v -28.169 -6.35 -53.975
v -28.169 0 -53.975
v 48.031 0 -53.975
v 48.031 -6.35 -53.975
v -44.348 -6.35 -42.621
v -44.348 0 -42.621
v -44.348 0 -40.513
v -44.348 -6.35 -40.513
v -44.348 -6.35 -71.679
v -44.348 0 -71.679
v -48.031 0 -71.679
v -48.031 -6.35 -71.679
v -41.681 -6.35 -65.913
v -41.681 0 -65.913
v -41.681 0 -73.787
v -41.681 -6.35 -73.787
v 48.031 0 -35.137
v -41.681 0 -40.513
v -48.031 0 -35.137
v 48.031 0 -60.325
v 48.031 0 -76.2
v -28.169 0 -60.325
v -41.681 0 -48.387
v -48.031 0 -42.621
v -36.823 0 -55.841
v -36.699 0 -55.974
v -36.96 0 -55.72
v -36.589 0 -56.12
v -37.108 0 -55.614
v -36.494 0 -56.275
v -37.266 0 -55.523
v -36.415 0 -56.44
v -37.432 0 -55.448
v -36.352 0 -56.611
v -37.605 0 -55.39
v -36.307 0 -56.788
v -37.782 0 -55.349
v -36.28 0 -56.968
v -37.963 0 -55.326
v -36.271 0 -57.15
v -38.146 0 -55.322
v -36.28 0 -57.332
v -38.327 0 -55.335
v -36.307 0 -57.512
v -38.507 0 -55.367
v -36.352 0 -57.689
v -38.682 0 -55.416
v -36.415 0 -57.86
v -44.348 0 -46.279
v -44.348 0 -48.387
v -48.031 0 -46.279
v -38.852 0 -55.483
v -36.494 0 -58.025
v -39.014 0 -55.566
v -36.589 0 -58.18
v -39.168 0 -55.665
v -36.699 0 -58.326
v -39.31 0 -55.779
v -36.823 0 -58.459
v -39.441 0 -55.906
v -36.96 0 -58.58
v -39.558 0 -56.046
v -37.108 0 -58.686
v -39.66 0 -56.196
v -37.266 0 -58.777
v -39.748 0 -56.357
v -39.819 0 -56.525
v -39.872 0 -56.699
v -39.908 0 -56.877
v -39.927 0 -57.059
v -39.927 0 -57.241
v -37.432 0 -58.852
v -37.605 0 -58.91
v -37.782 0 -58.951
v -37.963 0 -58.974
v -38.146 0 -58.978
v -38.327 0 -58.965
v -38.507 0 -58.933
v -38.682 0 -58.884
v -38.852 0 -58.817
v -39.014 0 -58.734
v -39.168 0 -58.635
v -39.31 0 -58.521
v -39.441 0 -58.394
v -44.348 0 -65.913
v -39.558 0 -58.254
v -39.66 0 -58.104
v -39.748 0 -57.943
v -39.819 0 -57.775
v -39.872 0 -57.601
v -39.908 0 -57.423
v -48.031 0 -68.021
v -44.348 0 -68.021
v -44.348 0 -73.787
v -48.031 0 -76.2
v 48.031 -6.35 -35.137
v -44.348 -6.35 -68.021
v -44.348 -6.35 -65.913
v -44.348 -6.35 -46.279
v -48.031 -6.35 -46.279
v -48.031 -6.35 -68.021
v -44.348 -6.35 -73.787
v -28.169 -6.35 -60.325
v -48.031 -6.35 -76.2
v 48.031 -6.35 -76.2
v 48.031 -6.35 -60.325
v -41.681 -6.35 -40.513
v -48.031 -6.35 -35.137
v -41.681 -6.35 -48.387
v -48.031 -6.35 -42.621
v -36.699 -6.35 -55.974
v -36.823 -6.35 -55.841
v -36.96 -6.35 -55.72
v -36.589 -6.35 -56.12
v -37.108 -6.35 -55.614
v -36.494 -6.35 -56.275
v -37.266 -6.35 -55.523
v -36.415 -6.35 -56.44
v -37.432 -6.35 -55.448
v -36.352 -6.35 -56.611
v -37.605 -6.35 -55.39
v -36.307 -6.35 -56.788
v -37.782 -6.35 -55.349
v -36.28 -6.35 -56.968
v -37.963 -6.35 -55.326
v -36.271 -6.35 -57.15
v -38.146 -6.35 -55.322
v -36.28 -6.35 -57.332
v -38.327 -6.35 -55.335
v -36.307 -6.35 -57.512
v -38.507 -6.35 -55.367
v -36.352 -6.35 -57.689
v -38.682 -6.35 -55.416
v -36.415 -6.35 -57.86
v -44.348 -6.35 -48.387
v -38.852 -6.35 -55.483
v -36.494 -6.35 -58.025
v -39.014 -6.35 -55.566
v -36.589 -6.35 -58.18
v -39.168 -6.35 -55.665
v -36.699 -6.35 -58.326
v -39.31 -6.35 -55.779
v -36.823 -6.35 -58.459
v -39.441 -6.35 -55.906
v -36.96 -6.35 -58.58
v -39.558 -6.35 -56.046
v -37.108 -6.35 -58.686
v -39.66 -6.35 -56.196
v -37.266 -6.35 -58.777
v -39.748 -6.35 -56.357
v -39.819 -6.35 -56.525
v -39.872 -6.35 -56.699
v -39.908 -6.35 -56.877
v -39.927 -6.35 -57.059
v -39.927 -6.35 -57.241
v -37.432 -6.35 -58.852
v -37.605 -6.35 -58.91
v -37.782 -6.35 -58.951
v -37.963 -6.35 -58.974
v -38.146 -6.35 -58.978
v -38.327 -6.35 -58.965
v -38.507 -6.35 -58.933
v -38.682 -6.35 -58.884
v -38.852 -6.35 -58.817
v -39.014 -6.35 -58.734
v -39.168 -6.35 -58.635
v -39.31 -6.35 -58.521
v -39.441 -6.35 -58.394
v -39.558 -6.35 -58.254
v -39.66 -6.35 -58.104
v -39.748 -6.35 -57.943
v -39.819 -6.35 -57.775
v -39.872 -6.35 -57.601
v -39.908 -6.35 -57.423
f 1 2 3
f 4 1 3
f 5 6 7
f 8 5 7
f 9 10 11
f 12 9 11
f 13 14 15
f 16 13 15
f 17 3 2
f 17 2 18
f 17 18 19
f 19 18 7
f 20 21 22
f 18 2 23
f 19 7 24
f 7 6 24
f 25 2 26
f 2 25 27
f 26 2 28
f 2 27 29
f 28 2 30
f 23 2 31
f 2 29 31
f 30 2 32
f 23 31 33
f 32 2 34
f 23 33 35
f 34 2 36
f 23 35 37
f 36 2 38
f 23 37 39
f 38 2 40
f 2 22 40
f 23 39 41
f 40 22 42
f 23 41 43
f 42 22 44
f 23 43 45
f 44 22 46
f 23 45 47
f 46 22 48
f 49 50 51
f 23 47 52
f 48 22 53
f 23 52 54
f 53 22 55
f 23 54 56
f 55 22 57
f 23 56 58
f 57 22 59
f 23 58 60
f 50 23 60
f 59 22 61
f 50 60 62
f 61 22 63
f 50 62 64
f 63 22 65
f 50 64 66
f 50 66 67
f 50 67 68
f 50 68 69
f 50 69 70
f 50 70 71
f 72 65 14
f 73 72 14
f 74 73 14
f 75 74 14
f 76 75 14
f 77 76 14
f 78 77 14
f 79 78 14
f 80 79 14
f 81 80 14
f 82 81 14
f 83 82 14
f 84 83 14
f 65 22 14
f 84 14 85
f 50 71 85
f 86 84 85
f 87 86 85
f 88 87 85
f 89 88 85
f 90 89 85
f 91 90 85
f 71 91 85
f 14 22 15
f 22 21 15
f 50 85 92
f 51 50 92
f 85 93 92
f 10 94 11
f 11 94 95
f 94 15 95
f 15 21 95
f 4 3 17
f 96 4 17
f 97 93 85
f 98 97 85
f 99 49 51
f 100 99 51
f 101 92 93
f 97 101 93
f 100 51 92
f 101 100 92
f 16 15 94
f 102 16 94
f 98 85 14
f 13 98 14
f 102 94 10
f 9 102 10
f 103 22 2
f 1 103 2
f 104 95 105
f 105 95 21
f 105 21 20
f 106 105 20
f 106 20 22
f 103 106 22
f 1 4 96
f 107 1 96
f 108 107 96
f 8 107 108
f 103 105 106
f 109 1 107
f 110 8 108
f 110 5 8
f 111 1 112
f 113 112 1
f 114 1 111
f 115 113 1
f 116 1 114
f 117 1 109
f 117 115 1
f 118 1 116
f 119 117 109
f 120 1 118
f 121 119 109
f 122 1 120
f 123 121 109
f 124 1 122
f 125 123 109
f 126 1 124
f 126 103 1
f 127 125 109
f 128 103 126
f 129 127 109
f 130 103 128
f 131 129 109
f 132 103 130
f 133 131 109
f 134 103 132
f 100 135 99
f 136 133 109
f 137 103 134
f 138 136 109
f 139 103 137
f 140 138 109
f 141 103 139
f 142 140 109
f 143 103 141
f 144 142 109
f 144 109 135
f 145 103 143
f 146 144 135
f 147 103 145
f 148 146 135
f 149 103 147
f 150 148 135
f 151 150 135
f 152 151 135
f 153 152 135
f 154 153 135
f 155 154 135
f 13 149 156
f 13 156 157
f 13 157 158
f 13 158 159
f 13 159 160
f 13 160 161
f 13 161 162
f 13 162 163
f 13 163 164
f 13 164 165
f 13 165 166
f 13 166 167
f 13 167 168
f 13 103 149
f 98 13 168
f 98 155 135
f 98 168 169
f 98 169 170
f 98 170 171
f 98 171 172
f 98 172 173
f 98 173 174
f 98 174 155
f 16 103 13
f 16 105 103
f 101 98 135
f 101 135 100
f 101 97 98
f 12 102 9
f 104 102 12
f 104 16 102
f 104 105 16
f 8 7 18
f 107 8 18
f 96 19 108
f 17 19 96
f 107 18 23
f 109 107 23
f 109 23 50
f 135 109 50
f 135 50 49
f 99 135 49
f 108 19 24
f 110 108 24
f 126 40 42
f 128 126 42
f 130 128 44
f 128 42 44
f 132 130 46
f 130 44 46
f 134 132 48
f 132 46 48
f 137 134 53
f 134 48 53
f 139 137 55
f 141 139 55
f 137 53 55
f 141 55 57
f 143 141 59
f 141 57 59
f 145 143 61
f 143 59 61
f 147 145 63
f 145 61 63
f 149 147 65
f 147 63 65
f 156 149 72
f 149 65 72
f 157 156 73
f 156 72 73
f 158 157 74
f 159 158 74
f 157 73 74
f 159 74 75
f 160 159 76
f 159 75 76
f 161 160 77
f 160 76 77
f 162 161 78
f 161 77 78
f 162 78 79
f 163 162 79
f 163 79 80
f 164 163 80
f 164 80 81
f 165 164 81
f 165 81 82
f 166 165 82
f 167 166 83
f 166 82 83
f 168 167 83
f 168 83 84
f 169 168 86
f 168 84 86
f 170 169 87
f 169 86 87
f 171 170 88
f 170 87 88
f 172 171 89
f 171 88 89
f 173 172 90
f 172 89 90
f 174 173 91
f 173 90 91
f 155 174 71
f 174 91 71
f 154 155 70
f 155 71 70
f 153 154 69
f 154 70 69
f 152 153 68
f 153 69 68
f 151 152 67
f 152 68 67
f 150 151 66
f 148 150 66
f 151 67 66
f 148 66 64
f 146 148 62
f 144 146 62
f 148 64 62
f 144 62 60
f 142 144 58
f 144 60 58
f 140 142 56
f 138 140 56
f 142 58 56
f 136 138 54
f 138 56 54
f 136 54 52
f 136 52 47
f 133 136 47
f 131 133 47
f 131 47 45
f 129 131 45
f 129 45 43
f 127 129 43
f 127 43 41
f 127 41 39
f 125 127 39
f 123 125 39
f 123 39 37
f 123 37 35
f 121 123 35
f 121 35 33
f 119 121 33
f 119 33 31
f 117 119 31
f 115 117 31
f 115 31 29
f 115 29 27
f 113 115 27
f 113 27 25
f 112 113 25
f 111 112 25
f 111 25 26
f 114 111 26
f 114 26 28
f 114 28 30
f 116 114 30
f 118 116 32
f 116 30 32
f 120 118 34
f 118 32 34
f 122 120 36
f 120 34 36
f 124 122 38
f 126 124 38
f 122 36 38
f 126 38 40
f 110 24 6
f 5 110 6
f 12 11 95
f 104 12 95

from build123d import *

# Parameters (mm, degrees)
SKETCH1_R               = 1.8288
BOSS_EXTRUDE1_DEPTH     = 6.35
SKETCH2_W               = 96.0628
SKETCH2_H               = 111.337442597
CUT_EXTRUDE1_DEPTH      = 1
CUT_EXTRUDE1_DEPTH_BACK = 7.35


with BuildPart() as part:
    # Sketch1 → Boss-Extrude1 (new body)
    with BuildSketch(Plane(origin=(0, 0, 0), x_dir=(1, 0, 0), z_dir=(0, 1, 0))):
        Polygon((-48.0314, 76.2), (48.0314, 76.2), (48.0314, 60.325), (-28.1686, 60.325), (-28.1686, 53.975), (48.0314, 53.975), (48.0314, 22.225), (-28.1686, 22.225), (-28.1686, 15.875), (48.0314, 15.875), (48.0314, -15.875), (-28.1686, -15.875), (-28.1686, -22.225), (48.0314, -22.225), (48.0314, -53.975), (-28.1686, -53.975), (-28.1686, -60.325), (48.0314, -60.325), (48.0314, -76.2), (-48.0314, -76.2), (-48.0314, -33.5788), (-44.3484, -33.5788), (-44.3484, -35.687), (-41.6814, -35.687), (-41.6814, -27.813), (-44.3484, -27.813), (-44.3484, -29.9212), (-48.0314, -29.9212), (-48.0314, 4.5212), (-44.3484, 4.5212), (-44.3484, 2.413), (-41.6814, 2.413), (-41.6814, 10.287), (-44.3484, 10.287), (-44.3484, 8.1788), (-48.0314, 8.1788), (-48.0314, 42.6212), (-44.3484, 42.6212), (-44.3484, 40.513), (-41.6814, 40.513), (-41.6814, 48.387), (-44.3484, 48.387), (-44.3484, 46.2788), (-48.0314, 46.2788), (-48.0314, 68.0212), (-44.3484, 68.0212), (-44.3484, 65.913), (-41.6814, 65.913), (-41.6814, 73.787), (-44.3484, 73.787), (-44.3484, 71.6788), (-48.0314, 71.6788), align=None)
        with Locations((-38.1, 57.15)):
            Circle(SKETCH1_R, mode=Mode.SUBTRACT)
        with Locations((-38.1, 31.75)):
            Circle(SKETCH1_R, mode=Mode.SUBTRACT)
        with Locations((-38.1, 6.35)):
            Circle(SKETCH1_R, mode=Mode.SUBTRACT)
        with Locations((-38.1, -19.05)):
            Circle(SKETCH1_R, mode=Mode.SUBTRACT)
    extrude(amount=-BOSS_EXTRUDE1_DEPTH)

    # Sketch2 → Cut-Extrude1 (cut, two sides)
    with BuildSketch(Plane(origin=(0, 0, 0), x_dir=(1, 0, 0), z_dir=(0, 1, 0))) as cut_extrude1_sk:
        with Locations((0, -20.531278701)):
            Rectangle(SKETCH2_W, SKETCH2_H)
    extrude(amount=CUT_EXTRUDE1_DEPTH, mode=Mode.SUBTRACT)
    extrude(cut_extrude1_sk.sketch, amount=-CUT_EXTRUDE1_DEPTH_BACK, mode=Mode.SUBTRACT)


solid = part.part
